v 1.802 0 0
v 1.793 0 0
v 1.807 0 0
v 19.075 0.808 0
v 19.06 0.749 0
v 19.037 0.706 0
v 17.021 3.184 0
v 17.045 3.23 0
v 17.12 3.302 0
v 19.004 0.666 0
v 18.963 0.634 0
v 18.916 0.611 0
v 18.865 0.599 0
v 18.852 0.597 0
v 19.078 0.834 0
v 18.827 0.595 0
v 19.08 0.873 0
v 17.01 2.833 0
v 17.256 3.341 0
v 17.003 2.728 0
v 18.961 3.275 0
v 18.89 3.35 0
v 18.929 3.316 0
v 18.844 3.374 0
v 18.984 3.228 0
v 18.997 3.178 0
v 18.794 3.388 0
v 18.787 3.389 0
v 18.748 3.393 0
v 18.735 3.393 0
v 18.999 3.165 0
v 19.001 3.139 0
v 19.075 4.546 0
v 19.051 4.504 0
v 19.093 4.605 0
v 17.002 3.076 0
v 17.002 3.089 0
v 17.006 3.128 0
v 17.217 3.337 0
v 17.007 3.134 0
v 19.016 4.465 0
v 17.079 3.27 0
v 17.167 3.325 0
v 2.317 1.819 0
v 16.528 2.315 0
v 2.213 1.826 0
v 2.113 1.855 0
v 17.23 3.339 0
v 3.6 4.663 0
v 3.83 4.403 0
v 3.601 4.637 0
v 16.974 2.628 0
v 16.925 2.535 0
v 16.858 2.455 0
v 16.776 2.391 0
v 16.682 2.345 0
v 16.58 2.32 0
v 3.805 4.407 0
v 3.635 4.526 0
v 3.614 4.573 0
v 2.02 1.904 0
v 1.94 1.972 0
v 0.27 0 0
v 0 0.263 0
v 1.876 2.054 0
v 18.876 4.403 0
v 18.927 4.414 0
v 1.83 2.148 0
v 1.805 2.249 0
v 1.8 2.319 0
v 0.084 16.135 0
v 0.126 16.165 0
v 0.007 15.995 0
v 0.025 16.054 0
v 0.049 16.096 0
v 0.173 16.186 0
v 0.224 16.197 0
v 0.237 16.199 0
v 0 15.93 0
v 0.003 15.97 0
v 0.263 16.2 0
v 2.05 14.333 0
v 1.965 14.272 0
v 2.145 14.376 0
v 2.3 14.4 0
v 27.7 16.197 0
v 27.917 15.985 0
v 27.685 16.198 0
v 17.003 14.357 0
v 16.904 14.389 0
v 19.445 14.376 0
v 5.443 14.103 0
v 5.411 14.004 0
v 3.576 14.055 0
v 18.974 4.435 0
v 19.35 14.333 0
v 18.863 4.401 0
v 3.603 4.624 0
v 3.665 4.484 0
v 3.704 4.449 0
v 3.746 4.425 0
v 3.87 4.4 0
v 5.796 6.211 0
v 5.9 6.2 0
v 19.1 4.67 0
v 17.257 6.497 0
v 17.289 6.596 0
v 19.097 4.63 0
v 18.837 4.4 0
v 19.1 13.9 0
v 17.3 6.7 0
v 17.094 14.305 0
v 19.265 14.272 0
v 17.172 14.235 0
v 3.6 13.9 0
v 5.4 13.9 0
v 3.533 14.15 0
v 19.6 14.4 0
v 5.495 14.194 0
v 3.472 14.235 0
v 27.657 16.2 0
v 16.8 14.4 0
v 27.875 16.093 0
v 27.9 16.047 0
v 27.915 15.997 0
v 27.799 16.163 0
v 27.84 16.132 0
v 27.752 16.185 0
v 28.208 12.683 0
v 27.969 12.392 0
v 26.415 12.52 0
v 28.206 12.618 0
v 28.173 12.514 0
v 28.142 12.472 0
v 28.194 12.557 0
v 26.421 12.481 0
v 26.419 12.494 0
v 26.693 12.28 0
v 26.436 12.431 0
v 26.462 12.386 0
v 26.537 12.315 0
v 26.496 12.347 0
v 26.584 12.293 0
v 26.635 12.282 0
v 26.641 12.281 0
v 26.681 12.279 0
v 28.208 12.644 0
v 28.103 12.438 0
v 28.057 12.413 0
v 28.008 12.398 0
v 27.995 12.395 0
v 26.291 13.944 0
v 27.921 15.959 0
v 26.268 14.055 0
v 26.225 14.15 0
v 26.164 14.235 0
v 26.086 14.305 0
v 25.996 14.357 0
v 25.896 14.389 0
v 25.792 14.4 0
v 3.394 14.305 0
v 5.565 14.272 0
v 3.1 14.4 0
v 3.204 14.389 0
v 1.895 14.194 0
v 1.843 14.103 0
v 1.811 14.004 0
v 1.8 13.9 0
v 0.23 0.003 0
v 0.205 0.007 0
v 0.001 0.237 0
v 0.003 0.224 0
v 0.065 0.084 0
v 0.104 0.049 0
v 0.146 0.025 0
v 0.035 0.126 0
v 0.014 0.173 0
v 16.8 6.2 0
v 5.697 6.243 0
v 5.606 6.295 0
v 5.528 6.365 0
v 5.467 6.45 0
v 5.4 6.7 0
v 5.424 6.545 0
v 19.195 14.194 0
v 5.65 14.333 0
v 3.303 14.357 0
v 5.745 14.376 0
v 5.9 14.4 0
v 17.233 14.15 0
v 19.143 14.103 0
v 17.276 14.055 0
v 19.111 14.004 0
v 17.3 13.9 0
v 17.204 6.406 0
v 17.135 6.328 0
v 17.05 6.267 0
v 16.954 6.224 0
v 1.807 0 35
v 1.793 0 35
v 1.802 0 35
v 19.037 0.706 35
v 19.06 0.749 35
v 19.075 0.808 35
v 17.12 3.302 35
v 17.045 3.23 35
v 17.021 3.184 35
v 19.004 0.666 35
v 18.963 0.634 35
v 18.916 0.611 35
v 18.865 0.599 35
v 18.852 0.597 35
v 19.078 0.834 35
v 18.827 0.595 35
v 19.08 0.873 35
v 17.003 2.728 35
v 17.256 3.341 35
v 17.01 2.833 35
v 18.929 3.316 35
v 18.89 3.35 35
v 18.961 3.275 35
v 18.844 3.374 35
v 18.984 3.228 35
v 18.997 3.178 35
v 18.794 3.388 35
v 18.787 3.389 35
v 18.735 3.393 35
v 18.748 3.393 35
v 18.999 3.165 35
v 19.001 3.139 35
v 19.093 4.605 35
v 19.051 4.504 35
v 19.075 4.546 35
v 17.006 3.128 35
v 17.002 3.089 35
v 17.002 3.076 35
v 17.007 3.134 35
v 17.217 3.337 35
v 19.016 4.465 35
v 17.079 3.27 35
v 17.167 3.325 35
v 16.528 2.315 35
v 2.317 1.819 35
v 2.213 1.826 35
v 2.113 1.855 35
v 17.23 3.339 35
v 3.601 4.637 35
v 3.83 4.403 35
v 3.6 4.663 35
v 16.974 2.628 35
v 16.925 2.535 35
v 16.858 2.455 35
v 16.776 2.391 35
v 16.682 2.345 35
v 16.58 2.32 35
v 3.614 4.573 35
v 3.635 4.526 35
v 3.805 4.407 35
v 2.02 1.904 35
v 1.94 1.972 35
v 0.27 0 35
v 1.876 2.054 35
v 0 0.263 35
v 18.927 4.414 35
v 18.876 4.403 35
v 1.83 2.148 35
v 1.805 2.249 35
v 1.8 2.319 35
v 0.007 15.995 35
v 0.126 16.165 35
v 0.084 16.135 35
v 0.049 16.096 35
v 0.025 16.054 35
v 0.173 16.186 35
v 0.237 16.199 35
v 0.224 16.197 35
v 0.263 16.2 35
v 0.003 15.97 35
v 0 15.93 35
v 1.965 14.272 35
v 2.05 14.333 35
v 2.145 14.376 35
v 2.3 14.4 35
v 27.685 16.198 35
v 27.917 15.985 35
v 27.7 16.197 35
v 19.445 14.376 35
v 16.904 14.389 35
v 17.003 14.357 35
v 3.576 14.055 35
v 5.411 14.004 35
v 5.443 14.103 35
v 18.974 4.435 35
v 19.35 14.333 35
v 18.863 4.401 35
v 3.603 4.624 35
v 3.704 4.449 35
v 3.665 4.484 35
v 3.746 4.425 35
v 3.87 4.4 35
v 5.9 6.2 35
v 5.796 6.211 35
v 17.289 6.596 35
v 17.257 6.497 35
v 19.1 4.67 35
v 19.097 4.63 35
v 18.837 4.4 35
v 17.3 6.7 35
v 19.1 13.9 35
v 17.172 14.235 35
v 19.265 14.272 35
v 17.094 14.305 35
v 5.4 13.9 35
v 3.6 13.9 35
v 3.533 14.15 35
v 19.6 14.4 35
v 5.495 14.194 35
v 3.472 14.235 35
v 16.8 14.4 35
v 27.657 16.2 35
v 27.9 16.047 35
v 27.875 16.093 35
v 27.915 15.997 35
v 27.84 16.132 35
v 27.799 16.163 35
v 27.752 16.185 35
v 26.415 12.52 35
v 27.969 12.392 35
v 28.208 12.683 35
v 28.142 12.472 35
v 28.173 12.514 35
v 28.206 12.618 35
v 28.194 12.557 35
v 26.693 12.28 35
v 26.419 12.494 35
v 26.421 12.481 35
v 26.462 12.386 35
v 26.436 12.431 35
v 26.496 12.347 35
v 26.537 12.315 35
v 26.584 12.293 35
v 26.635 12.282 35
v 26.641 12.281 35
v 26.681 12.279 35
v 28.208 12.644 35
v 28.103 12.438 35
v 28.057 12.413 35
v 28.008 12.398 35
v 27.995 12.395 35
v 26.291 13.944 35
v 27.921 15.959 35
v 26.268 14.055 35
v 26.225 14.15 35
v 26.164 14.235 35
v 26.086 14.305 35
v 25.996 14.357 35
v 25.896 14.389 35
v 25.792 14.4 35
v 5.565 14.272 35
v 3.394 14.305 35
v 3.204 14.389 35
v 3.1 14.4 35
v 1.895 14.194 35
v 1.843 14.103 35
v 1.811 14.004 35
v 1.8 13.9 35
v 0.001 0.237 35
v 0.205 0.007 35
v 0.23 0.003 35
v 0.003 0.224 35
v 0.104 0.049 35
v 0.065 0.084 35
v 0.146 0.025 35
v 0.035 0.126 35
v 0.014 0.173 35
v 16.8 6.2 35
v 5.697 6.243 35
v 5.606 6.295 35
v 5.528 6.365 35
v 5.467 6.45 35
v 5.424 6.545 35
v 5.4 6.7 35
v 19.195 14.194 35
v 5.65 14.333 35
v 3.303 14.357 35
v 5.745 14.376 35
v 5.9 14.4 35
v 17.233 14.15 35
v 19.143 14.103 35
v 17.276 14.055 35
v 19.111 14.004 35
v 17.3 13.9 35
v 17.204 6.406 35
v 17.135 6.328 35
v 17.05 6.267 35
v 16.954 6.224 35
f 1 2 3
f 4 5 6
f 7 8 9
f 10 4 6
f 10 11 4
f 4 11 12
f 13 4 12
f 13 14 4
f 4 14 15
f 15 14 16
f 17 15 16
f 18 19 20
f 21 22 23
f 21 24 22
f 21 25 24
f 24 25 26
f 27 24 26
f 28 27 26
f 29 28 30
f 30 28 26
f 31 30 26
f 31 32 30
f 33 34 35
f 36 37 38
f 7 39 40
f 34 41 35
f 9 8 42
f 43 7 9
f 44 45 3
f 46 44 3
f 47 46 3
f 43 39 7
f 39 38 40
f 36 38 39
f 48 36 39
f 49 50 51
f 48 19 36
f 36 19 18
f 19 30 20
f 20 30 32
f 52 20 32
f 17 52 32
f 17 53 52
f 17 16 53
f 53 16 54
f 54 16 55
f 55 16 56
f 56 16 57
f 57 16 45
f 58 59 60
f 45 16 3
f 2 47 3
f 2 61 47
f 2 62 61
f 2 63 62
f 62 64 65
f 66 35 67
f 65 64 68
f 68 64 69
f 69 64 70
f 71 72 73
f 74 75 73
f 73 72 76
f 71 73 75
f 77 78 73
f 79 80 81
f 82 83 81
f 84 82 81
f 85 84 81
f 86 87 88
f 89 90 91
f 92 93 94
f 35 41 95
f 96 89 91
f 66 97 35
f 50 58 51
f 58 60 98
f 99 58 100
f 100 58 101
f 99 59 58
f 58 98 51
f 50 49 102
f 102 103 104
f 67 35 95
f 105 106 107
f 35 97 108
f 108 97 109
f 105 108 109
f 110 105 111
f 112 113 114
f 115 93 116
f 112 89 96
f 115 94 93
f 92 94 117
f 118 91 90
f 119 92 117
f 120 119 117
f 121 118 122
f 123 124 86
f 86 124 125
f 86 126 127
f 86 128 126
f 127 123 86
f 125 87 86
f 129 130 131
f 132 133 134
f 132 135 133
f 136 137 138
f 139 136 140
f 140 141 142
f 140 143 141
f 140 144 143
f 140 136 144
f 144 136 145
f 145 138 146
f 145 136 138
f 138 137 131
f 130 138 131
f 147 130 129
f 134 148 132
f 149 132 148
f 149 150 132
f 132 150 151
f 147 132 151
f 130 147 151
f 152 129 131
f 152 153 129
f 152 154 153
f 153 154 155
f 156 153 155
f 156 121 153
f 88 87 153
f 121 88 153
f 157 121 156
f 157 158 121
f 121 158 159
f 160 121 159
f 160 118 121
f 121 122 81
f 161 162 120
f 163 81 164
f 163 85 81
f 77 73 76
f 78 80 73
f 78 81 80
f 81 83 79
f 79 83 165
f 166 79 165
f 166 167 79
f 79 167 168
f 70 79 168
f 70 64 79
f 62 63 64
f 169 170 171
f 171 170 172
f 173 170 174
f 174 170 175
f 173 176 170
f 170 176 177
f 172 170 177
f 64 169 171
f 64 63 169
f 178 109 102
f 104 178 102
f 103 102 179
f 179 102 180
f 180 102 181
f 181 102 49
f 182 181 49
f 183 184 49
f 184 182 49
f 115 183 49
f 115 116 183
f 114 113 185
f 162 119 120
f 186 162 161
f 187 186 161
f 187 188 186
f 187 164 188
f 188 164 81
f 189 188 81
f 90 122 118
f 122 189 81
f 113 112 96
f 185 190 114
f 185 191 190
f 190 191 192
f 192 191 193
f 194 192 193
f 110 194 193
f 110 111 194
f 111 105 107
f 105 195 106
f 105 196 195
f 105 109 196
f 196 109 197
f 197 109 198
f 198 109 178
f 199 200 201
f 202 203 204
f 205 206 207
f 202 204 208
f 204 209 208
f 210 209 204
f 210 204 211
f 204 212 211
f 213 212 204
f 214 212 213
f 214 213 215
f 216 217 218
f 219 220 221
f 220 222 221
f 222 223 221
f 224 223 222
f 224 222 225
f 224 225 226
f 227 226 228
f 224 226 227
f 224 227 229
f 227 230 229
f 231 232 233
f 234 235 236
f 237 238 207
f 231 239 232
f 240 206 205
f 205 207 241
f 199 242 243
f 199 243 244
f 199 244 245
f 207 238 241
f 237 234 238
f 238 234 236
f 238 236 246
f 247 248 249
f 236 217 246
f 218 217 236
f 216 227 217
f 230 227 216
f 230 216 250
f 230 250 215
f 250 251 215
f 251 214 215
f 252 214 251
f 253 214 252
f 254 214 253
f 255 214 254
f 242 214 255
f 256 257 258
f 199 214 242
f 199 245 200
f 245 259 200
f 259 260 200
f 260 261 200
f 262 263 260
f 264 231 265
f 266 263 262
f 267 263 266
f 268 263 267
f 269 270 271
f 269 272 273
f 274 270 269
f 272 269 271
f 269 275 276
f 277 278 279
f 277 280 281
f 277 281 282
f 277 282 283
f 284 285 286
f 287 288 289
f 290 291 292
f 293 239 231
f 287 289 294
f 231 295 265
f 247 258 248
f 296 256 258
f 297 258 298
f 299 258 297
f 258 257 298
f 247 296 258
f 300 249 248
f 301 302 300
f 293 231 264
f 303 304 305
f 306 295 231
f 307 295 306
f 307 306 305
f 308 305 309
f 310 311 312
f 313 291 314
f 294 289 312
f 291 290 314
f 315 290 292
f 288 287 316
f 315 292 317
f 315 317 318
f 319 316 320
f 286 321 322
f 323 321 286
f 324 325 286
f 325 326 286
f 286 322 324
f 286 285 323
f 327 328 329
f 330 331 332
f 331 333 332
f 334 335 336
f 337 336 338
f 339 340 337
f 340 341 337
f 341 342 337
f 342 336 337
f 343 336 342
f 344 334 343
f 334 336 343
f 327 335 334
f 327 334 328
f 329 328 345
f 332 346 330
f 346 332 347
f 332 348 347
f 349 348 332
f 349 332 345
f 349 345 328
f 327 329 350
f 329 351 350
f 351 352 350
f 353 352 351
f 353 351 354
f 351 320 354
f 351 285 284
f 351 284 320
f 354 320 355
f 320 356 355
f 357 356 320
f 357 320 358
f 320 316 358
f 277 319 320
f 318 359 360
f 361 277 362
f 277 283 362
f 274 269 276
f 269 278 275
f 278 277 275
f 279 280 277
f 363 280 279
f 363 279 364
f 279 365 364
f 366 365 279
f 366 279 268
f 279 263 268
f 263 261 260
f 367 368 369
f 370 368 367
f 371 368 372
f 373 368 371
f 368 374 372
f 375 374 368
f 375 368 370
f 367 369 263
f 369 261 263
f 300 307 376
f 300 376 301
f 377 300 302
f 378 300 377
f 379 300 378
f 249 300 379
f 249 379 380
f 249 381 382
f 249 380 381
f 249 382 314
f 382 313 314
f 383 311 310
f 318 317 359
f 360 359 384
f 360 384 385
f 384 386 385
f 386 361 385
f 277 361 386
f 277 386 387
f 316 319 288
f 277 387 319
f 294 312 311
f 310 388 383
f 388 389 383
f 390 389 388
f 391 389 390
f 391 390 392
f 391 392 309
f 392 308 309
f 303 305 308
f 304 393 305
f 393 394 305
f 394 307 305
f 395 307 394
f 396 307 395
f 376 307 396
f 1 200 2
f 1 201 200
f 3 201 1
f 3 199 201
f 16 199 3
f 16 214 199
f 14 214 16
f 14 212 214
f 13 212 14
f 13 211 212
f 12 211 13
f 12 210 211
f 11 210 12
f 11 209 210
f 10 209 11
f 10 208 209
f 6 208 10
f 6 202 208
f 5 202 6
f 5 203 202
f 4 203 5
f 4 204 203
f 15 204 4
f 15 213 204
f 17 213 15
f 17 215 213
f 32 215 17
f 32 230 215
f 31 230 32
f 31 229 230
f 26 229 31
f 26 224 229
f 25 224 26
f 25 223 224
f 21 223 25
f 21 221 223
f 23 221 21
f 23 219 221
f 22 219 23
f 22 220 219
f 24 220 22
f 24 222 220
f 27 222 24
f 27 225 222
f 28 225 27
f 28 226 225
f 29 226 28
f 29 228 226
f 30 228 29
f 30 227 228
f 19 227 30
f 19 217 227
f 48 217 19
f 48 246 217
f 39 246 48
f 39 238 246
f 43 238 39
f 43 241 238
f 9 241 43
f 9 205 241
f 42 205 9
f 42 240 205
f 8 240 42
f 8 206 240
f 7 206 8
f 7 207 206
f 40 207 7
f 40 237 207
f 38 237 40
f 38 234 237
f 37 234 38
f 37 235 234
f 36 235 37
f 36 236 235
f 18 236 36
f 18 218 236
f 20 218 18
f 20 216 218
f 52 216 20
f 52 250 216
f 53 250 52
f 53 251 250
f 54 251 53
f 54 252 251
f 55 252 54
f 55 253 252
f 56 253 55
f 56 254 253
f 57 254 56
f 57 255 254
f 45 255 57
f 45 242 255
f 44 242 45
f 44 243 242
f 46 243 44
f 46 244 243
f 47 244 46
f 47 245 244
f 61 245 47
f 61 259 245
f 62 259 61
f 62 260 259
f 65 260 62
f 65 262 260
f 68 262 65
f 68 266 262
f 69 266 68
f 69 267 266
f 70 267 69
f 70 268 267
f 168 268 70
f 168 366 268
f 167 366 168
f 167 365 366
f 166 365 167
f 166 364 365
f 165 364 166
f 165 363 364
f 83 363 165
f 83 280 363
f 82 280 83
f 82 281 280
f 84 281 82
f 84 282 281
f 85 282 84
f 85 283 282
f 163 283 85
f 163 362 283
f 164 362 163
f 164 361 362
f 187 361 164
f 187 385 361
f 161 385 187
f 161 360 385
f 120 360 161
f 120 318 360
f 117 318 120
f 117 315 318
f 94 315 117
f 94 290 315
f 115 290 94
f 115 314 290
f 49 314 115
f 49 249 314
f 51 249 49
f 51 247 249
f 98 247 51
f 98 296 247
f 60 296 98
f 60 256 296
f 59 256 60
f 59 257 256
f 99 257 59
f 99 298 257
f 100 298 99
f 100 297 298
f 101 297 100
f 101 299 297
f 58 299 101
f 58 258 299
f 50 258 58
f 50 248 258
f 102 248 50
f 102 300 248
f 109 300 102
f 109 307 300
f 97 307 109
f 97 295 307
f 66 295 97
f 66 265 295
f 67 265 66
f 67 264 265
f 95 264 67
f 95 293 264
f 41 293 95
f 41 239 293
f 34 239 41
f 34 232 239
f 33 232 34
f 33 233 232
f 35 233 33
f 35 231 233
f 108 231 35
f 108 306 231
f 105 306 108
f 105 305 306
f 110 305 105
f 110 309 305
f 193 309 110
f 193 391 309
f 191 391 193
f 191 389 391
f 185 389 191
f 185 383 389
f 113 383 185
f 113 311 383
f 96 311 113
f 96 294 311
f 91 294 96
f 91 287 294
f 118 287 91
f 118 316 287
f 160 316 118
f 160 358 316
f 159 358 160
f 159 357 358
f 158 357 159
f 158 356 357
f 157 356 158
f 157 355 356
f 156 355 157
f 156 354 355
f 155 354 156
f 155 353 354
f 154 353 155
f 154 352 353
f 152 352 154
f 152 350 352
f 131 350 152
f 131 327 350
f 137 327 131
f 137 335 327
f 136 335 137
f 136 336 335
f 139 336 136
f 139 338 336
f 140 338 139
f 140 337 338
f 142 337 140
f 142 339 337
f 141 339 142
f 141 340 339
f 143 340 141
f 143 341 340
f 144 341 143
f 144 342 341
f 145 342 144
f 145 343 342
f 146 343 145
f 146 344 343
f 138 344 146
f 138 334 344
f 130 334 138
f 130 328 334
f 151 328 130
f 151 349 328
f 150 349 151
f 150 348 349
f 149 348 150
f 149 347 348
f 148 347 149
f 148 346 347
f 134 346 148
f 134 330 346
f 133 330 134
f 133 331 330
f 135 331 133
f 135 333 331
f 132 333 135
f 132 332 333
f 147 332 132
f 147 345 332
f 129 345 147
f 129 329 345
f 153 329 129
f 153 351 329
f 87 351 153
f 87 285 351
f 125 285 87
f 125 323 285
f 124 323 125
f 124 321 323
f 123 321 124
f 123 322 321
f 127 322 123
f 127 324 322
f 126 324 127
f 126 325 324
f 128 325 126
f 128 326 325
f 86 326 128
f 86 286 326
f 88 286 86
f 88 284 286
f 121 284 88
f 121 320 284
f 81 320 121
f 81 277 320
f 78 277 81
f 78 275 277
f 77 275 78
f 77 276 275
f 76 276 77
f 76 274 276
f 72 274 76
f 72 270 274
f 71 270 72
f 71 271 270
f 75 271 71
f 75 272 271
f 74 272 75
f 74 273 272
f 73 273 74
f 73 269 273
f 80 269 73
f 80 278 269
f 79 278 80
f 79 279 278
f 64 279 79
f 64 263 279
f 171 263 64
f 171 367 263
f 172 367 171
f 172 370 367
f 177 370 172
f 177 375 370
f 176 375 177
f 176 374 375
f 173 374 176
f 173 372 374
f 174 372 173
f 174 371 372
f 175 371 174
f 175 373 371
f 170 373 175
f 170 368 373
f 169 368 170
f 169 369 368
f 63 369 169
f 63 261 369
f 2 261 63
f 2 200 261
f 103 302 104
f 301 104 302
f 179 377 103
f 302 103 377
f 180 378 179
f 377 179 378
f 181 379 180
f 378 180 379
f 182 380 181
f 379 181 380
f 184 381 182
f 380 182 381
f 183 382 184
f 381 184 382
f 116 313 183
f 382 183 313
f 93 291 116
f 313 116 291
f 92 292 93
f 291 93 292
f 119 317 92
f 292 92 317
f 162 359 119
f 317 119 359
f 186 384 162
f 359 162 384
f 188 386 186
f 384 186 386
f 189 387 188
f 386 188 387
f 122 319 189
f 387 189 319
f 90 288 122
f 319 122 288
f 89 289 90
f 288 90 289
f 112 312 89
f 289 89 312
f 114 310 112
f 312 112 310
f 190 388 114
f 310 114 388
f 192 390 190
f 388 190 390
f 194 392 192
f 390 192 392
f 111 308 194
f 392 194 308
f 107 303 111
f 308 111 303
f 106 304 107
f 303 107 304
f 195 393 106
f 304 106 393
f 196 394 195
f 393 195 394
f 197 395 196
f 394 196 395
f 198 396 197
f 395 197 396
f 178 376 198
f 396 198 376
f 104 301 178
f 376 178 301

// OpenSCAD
// Terminal clamp for soldering

TERM_HEIGHT = 10;
TERM_DEPTH = 8.8;
PCB_THICKNESS = 1.6;
FROM_EDGE = 15;
WALL = 1.8;
WIDTH = 35;
H_TERM_GRIP = 7.5;
BUMP = 1;

$fn = 30;

/*
                              <-D        <-E
   ──────────────────────────────────────── 
H  │             3              │          │
   │                            │          │
   │                          4 │        5 │
   │                            │           
   │                            │           
   │ 2                          │           
   │                            │           
   │────────────────────────────            
   │                                        
   │     1                     /              
   ───────────────────────────/─\             
   0                          <-A             

Edit/view: https://cascii.app/3955d
*/

INTERNAL_RADIUS = 0.5;
EXTERNAL_RADIUS = 0.25;

D = WALL + FROM_EDGE + INTERNAL_RADIUS;
A = D + WALL;
H = WALL + BUMP + PCB_THICKNESS + TERM_HEIGHT;
E = D + WALL + TERM_DEPTH - WALL;

echo(D, E);

linear_extrude(WIDTH)
  offset(-INTERNAL_RADIUS) offset(INTERNAL_RADIUS)
    offset(EXTERNAL_RADIUS) offset(-EXTERNAL_RADIUS) {
  // 1
  translate([WALL,0]) rotate(2) {
    square([A - WALL, WALL]);
    // 1 Pressure bump
    translate([A - WALL - 2*BUMP,WALL]) square([2*BUMP, BUMP]);
  }
    
  // 2
  square([WALL, H + WALL]);

  // 3
  translate([0,H]) square([E + WALL, WALL]);

  // 2/3/4 block (2nd WALL = GAP)
  difference() {
    translate([WALL + WALL,H - TERM_HEIGHT]) square([D - WALL, TERM_HEIGHT]);
    translate([WALL + WALL + WALL,H - TERM_HEIGHT + WALL]) square([D - WALL-2*WALL, TERM_HEIGHT-WALL]);
  }

  // 5
  //translate([E,H - H_TERM_GRIP]) square([WALL, H_TERM_GRIP]);  

  // 5 ALT
  q = 2;
  translate([D + WALL + 7,H + WALL - q]) translate([WALL,q]) rotate(180+5) square([WALL, WALL + q]);

}
